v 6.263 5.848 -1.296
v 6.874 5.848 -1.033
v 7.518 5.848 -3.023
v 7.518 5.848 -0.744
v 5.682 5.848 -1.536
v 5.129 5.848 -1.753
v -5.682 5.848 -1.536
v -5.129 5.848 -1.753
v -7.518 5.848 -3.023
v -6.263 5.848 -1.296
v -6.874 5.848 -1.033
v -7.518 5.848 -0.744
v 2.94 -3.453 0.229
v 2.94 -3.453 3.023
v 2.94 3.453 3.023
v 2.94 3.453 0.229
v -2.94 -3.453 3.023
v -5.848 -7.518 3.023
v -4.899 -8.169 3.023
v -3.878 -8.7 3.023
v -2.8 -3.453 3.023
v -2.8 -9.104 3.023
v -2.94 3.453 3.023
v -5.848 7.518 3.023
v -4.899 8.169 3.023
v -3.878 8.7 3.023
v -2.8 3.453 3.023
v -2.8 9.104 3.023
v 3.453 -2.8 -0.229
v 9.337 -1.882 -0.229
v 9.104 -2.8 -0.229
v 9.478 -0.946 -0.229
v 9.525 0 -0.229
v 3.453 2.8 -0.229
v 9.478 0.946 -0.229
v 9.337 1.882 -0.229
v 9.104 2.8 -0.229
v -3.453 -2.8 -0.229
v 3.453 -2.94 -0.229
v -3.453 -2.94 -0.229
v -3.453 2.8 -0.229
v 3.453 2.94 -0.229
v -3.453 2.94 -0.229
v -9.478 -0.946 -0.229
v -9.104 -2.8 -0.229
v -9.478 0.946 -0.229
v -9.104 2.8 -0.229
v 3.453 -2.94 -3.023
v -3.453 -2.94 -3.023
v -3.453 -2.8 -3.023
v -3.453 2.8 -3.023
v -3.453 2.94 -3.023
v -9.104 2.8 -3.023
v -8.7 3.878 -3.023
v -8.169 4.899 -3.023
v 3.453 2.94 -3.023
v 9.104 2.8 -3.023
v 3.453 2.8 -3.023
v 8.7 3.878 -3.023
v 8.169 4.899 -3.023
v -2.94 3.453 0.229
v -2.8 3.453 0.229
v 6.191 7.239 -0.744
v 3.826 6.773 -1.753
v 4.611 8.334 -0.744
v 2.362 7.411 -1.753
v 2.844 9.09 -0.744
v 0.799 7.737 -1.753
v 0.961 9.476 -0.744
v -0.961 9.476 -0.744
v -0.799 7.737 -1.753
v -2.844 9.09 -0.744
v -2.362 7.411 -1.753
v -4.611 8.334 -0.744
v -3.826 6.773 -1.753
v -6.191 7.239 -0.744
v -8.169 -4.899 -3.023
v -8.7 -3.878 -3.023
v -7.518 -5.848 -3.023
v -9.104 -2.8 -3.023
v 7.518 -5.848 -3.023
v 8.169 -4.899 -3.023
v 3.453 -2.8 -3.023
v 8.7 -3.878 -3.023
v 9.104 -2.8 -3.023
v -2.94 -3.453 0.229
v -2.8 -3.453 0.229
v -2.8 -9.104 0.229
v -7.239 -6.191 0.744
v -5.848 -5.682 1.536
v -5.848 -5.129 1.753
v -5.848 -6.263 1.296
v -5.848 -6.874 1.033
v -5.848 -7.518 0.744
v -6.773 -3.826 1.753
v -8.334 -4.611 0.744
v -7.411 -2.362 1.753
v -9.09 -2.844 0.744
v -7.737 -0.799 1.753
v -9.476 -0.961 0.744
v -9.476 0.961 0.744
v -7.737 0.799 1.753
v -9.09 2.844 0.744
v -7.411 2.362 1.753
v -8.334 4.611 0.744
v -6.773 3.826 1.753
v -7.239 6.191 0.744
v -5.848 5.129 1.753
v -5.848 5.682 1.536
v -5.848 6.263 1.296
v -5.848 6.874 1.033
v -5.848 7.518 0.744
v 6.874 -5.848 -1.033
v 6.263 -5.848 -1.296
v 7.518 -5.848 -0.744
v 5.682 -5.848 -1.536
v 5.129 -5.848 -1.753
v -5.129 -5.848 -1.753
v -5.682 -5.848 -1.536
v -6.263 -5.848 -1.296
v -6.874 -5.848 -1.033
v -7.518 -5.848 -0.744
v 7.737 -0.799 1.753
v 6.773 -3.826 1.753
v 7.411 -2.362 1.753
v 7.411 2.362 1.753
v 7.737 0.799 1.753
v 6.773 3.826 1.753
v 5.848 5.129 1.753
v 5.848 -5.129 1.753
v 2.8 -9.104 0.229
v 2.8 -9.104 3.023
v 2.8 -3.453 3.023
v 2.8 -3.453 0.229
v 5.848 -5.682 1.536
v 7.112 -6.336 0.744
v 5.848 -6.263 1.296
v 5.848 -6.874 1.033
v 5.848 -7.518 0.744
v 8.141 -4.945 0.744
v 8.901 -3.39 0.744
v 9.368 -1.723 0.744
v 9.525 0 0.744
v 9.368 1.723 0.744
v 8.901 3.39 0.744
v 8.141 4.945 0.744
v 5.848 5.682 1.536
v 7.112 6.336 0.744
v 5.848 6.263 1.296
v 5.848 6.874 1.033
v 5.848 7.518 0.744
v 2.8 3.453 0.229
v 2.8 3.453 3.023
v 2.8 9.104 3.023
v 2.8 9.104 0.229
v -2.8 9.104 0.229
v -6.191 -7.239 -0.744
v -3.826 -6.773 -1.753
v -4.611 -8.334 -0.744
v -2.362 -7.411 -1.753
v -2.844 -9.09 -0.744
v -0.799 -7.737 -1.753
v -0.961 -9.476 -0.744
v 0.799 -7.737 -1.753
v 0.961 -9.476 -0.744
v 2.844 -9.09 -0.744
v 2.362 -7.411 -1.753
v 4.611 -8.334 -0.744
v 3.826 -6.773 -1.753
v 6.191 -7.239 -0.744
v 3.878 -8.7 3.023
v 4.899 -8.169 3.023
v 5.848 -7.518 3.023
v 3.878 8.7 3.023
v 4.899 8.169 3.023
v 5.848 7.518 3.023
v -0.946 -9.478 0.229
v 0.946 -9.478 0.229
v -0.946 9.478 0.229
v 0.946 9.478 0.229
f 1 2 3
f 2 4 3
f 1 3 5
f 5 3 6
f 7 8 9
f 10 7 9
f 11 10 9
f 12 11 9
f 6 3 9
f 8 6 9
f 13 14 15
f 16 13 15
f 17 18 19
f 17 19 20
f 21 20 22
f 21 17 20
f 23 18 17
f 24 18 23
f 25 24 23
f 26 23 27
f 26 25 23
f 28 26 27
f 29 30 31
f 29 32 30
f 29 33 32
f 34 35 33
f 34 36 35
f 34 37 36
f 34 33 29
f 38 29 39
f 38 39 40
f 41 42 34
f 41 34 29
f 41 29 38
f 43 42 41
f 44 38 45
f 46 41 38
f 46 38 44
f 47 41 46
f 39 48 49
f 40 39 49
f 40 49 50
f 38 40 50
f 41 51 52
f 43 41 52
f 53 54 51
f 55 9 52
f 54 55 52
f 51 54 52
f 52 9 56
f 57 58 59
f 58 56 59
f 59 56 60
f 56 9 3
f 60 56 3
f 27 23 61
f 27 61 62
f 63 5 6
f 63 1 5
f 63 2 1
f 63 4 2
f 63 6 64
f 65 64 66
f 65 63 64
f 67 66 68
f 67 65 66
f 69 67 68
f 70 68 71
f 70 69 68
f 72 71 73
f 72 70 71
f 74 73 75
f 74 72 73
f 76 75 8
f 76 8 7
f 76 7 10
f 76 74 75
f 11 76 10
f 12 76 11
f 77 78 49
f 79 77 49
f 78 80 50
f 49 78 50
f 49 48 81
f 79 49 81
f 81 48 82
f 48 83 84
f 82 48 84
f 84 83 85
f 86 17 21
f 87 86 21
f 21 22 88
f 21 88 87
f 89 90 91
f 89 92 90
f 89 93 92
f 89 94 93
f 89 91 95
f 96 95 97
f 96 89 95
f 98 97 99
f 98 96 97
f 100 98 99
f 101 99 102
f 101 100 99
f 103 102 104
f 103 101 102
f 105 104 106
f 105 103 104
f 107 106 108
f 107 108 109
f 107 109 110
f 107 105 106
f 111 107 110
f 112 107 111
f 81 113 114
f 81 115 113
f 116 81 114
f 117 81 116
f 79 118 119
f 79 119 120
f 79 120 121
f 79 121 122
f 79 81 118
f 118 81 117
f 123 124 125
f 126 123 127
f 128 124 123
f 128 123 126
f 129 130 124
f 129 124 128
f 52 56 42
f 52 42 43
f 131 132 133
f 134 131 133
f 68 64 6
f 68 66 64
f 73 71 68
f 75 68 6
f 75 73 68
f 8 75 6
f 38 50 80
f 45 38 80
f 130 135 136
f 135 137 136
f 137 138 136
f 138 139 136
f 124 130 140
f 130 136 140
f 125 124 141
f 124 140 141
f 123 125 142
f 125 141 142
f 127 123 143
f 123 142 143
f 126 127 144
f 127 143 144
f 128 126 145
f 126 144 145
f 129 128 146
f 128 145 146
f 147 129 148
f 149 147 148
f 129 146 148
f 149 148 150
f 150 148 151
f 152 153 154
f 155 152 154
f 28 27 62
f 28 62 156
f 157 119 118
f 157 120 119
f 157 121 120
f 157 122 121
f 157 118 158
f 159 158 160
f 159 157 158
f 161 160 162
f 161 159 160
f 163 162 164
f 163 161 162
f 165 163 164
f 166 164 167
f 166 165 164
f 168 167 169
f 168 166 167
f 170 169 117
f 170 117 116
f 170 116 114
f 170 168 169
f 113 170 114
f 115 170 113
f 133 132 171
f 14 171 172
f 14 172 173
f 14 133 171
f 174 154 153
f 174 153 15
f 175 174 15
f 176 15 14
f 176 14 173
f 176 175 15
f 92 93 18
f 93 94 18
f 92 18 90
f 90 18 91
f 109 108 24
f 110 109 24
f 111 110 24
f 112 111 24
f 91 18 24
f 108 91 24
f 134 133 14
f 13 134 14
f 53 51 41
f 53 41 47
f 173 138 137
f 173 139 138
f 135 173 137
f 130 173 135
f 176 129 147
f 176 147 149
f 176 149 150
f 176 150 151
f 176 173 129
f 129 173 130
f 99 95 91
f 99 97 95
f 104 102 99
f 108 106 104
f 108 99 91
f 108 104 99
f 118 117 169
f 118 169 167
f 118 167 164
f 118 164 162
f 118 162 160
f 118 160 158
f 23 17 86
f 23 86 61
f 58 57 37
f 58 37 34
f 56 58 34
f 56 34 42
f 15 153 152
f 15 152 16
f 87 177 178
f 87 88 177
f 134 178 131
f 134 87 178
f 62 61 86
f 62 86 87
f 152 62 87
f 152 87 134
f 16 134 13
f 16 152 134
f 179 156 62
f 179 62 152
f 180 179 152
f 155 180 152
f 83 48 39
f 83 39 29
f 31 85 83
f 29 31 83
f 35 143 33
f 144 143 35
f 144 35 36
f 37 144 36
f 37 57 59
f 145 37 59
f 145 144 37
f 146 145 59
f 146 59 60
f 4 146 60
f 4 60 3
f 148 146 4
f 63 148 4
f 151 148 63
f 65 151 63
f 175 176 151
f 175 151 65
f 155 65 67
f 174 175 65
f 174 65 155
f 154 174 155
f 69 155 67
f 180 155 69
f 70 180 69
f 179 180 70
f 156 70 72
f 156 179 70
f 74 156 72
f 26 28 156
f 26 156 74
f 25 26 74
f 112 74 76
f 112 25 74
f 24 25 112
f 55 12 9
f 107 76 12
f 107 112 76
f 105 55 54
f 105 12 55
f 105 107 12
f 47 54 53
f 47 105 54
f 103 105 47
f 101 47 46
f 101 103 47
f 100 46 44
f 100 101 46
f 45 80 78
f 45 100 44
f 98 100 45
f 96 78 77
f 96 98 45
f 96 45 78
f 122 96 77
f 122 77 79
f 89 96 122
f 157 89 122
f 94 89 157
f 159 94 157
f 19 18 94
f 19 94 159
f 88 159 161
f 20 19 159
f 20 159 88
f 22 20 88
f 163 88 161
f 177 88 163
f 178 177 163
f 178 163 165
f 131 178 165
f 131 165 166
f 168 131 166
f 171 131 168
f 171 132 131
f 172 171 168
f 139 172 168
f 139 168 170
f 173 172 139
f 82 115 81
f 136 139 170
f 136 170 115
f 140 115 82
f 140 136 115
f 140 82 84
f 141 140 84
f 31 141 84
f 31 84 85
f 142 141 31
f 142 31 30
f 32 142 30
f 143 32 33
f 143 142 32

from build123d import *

# Parameters (mm, degrees)
SKETCH1_R             = 9.525
BOSS_EXTRUDE1_DEPTH   = 3.0226
SKETCH2_W             = 5.6007
SKETCH2_H             = 19.05
CUT_EXTRUDE1_DEPTH    = 2.794
SKETCH3_W             = 19.05
SKETCH3_H             = 5.6007
CUT_EXTRUDE2_DEPTH    = 2.794
SKETCH4_W             = 3.67665
SKETCH4_H             = 19.05
CUT_EXTRUDE3_DEPTH    = 1.27
SKETCH5_W             = 19.05
SKETCH5_H             = 3.67665
CUT_EXTRUDE4_DEPTH    = 1.27
CHAMFER1_SIZE         = 1.74640875
CHAMFER1_SIZE2        = 1.008289562
CHAMFER1_PART_2_SIZE  = 1.74640875
CHAMFER1_PART_2_SIZE2 = 1.008289562
CHAMFER1_PART_3_SIZE  = 1.74640875
CHAMFER1_PART_3_SIZE2 = 1.008289562
CHAMFER1_PART_4_SIZE  = 1.74640875
CHAMFER1_PART_4_SIZE2 = 1.008289562
SKETCH6_W             = 5.880735
SKETCH6_H             = 6.905625
CUT_EXTRUDE5_DEPTH    = 2.794
SKETCH7_W             = 6.905625
SKETCH7_H             = 5.880735
CUT_EXTRUDE6_DEPTH    = 2.794


with BuildPart() as part:
    # Sketch1 → Boss-Extrude1 (new body, symmetric)
    with BuildSketch(Plane.XY):
        Circle(SKETCH1_R)
    extrude(amount=BOSS_EXTRUDE1_DEPTH, both=True)

    # Sketch2 → Cut-Extrude1 (cut)
    with BuildSketch(Plane.XY.offset(3.0226)):
        Rectangle(SKETCH2_W, SKETCH2_H)
    extrude(amount=-CUT_EXTRUDE1_DEPTH, mode=Mode.SUBTRACT)

    # Sketch3 → Cut-Extrude2 (cut)
    with BuildSketch(Plane(origin=(0, 0, -3.0226), x_dir=(-1, 0, 0), z_dir=(0, 0, -1))):
        Rectangle(SKETCH3_W, SKETCH3_H)
    extrude(amount=-CUT_EXTRUDE2_DEPTH, mode=Mode.SUBTRACT)

    # Sketch4 → Cut-Extrude3 (cut)
    with BuildSketch(Plane.XY.offset(3.0226)):
        with Locations((7.686675, 0)):
            Rectangle(SKETCH4_W, SKETCH4_H)
        with Locations((-7.686675, 0)):
            Rectangle(SKETCH4_W, SKETCH4_H)
    extrude(amount=-CUT_EXTRUDE3_DEPTH, mode=Mode.SUBTRACT)

    # Sketch5 → Cut-Extrude4 (cut)
    with BuildSketch(Plane(origin=(0, 0, -3.0226), x_dir=(-1, 0, 0), z_dir=(0, 0, -1))):
        with Locations((0, 7.686675)):
            Rectangle(SKETCH5_W, SKETCH5_H)
        with Locations((0, -7.686675)):
            Rectangle(SKETCH5_W, SKETCH5_H)
    extrude(amount=-CUT_EXTRUDE4_DEPTH, mode=Mode.SUBTRACT)

    # Chamfer1
    chamfer1_edges = [part.edges().sort_by_distance(p)[0] for p in [
        (0, 9.525, -1.7526),
    ]]
    chamfer1_side = [part.faces().sort_by_distance(p)[0] for p in [
        (0, 7.346425268, -1.7526),
    ]]
    chamfer(chamfer1_edges, length=CHAMFER1_SIZE, length2=CHAMFER1_SIZE2, reference=chamfer1_side[0])

    # Chamfer1 part 2
    chamfer1_part_2_edges = [part.edges().sort_by_distance(p)[0] for p in [
        (0, -9.525, -1.7526),
    ]]
    chamfer1_part_2_side = [part.faces().sort_by_distance(p)[0] for p in [
        (0, -7.346425268, -1.7526),
    ]]
    chamfer(chamfer1_part_2_edges, length=CHAMFER1_PART_2_SIZE, length2=CHAMFER1_PART_2_SIZE2, reference=chamfer1_part_2_side[0])

    # Chamfer1 part 3
    chamfer1_part_3_edges = [part.edges().sort_by_distance(p)[0] for p in [
        (8.556610274, -4.184500642, 1.7526),
    ]]
    chamfer1_part_3_side = [part.faces().sort_by_distance(p)[0] for p in [
        (7.346425268, 0, 1.7526),
    ]]
    chamfer(chamfer1_part_3_edges, length=CHAMFER1_PART_3_SIZE, length2=CHAMFER1_PART_3_SIZE2, reference=chamfer1_part_3_side[0])

    # Chamfer1 part 4
    chamfer1_part_4_edges = [part.edges().sort_by_distance(p)[0] for p in [
        (-9.525, 0, 1.7526),
    ]]
    chamfer1_part_4_side = [part.faces().sort_by_distance(p)[0] for p in [
        (-7.346425268, 0, 1.7526),
    ]]
    chamfer(chamfer1_part_4_edges, length=CHAMFER1_PART_4_SIZE, length2=CHAMFER1_PART_4_SIZE2, reference=chamfer1_part_4_side[0])

    # Sketch6 → Cut-Extrude5 (cut)
    with BuildSketch(Plane.XY.offset(3.0226)):
        Rectangle(SKETCH6_W, SKETCH6_H)
    extrude(amount=-CUT_EXTRUDE5_DEPTH, mode=Mode.SUBTRACT)

    # Sketch7 → Cut-Extrude6 (cut)
    with BuildSketch(Plane(origin=(0, 0, -3.0226), x_dir=(-1, 0, 0), z_dir=(0, 0, -1))):
        Rectangle(SKETCH7_W, SKETCH7_H)
    extrude(amount=-CUT_EXTRUDE6_DEPTH, mode=Mode.SUBTRACT)


solid = part.part
